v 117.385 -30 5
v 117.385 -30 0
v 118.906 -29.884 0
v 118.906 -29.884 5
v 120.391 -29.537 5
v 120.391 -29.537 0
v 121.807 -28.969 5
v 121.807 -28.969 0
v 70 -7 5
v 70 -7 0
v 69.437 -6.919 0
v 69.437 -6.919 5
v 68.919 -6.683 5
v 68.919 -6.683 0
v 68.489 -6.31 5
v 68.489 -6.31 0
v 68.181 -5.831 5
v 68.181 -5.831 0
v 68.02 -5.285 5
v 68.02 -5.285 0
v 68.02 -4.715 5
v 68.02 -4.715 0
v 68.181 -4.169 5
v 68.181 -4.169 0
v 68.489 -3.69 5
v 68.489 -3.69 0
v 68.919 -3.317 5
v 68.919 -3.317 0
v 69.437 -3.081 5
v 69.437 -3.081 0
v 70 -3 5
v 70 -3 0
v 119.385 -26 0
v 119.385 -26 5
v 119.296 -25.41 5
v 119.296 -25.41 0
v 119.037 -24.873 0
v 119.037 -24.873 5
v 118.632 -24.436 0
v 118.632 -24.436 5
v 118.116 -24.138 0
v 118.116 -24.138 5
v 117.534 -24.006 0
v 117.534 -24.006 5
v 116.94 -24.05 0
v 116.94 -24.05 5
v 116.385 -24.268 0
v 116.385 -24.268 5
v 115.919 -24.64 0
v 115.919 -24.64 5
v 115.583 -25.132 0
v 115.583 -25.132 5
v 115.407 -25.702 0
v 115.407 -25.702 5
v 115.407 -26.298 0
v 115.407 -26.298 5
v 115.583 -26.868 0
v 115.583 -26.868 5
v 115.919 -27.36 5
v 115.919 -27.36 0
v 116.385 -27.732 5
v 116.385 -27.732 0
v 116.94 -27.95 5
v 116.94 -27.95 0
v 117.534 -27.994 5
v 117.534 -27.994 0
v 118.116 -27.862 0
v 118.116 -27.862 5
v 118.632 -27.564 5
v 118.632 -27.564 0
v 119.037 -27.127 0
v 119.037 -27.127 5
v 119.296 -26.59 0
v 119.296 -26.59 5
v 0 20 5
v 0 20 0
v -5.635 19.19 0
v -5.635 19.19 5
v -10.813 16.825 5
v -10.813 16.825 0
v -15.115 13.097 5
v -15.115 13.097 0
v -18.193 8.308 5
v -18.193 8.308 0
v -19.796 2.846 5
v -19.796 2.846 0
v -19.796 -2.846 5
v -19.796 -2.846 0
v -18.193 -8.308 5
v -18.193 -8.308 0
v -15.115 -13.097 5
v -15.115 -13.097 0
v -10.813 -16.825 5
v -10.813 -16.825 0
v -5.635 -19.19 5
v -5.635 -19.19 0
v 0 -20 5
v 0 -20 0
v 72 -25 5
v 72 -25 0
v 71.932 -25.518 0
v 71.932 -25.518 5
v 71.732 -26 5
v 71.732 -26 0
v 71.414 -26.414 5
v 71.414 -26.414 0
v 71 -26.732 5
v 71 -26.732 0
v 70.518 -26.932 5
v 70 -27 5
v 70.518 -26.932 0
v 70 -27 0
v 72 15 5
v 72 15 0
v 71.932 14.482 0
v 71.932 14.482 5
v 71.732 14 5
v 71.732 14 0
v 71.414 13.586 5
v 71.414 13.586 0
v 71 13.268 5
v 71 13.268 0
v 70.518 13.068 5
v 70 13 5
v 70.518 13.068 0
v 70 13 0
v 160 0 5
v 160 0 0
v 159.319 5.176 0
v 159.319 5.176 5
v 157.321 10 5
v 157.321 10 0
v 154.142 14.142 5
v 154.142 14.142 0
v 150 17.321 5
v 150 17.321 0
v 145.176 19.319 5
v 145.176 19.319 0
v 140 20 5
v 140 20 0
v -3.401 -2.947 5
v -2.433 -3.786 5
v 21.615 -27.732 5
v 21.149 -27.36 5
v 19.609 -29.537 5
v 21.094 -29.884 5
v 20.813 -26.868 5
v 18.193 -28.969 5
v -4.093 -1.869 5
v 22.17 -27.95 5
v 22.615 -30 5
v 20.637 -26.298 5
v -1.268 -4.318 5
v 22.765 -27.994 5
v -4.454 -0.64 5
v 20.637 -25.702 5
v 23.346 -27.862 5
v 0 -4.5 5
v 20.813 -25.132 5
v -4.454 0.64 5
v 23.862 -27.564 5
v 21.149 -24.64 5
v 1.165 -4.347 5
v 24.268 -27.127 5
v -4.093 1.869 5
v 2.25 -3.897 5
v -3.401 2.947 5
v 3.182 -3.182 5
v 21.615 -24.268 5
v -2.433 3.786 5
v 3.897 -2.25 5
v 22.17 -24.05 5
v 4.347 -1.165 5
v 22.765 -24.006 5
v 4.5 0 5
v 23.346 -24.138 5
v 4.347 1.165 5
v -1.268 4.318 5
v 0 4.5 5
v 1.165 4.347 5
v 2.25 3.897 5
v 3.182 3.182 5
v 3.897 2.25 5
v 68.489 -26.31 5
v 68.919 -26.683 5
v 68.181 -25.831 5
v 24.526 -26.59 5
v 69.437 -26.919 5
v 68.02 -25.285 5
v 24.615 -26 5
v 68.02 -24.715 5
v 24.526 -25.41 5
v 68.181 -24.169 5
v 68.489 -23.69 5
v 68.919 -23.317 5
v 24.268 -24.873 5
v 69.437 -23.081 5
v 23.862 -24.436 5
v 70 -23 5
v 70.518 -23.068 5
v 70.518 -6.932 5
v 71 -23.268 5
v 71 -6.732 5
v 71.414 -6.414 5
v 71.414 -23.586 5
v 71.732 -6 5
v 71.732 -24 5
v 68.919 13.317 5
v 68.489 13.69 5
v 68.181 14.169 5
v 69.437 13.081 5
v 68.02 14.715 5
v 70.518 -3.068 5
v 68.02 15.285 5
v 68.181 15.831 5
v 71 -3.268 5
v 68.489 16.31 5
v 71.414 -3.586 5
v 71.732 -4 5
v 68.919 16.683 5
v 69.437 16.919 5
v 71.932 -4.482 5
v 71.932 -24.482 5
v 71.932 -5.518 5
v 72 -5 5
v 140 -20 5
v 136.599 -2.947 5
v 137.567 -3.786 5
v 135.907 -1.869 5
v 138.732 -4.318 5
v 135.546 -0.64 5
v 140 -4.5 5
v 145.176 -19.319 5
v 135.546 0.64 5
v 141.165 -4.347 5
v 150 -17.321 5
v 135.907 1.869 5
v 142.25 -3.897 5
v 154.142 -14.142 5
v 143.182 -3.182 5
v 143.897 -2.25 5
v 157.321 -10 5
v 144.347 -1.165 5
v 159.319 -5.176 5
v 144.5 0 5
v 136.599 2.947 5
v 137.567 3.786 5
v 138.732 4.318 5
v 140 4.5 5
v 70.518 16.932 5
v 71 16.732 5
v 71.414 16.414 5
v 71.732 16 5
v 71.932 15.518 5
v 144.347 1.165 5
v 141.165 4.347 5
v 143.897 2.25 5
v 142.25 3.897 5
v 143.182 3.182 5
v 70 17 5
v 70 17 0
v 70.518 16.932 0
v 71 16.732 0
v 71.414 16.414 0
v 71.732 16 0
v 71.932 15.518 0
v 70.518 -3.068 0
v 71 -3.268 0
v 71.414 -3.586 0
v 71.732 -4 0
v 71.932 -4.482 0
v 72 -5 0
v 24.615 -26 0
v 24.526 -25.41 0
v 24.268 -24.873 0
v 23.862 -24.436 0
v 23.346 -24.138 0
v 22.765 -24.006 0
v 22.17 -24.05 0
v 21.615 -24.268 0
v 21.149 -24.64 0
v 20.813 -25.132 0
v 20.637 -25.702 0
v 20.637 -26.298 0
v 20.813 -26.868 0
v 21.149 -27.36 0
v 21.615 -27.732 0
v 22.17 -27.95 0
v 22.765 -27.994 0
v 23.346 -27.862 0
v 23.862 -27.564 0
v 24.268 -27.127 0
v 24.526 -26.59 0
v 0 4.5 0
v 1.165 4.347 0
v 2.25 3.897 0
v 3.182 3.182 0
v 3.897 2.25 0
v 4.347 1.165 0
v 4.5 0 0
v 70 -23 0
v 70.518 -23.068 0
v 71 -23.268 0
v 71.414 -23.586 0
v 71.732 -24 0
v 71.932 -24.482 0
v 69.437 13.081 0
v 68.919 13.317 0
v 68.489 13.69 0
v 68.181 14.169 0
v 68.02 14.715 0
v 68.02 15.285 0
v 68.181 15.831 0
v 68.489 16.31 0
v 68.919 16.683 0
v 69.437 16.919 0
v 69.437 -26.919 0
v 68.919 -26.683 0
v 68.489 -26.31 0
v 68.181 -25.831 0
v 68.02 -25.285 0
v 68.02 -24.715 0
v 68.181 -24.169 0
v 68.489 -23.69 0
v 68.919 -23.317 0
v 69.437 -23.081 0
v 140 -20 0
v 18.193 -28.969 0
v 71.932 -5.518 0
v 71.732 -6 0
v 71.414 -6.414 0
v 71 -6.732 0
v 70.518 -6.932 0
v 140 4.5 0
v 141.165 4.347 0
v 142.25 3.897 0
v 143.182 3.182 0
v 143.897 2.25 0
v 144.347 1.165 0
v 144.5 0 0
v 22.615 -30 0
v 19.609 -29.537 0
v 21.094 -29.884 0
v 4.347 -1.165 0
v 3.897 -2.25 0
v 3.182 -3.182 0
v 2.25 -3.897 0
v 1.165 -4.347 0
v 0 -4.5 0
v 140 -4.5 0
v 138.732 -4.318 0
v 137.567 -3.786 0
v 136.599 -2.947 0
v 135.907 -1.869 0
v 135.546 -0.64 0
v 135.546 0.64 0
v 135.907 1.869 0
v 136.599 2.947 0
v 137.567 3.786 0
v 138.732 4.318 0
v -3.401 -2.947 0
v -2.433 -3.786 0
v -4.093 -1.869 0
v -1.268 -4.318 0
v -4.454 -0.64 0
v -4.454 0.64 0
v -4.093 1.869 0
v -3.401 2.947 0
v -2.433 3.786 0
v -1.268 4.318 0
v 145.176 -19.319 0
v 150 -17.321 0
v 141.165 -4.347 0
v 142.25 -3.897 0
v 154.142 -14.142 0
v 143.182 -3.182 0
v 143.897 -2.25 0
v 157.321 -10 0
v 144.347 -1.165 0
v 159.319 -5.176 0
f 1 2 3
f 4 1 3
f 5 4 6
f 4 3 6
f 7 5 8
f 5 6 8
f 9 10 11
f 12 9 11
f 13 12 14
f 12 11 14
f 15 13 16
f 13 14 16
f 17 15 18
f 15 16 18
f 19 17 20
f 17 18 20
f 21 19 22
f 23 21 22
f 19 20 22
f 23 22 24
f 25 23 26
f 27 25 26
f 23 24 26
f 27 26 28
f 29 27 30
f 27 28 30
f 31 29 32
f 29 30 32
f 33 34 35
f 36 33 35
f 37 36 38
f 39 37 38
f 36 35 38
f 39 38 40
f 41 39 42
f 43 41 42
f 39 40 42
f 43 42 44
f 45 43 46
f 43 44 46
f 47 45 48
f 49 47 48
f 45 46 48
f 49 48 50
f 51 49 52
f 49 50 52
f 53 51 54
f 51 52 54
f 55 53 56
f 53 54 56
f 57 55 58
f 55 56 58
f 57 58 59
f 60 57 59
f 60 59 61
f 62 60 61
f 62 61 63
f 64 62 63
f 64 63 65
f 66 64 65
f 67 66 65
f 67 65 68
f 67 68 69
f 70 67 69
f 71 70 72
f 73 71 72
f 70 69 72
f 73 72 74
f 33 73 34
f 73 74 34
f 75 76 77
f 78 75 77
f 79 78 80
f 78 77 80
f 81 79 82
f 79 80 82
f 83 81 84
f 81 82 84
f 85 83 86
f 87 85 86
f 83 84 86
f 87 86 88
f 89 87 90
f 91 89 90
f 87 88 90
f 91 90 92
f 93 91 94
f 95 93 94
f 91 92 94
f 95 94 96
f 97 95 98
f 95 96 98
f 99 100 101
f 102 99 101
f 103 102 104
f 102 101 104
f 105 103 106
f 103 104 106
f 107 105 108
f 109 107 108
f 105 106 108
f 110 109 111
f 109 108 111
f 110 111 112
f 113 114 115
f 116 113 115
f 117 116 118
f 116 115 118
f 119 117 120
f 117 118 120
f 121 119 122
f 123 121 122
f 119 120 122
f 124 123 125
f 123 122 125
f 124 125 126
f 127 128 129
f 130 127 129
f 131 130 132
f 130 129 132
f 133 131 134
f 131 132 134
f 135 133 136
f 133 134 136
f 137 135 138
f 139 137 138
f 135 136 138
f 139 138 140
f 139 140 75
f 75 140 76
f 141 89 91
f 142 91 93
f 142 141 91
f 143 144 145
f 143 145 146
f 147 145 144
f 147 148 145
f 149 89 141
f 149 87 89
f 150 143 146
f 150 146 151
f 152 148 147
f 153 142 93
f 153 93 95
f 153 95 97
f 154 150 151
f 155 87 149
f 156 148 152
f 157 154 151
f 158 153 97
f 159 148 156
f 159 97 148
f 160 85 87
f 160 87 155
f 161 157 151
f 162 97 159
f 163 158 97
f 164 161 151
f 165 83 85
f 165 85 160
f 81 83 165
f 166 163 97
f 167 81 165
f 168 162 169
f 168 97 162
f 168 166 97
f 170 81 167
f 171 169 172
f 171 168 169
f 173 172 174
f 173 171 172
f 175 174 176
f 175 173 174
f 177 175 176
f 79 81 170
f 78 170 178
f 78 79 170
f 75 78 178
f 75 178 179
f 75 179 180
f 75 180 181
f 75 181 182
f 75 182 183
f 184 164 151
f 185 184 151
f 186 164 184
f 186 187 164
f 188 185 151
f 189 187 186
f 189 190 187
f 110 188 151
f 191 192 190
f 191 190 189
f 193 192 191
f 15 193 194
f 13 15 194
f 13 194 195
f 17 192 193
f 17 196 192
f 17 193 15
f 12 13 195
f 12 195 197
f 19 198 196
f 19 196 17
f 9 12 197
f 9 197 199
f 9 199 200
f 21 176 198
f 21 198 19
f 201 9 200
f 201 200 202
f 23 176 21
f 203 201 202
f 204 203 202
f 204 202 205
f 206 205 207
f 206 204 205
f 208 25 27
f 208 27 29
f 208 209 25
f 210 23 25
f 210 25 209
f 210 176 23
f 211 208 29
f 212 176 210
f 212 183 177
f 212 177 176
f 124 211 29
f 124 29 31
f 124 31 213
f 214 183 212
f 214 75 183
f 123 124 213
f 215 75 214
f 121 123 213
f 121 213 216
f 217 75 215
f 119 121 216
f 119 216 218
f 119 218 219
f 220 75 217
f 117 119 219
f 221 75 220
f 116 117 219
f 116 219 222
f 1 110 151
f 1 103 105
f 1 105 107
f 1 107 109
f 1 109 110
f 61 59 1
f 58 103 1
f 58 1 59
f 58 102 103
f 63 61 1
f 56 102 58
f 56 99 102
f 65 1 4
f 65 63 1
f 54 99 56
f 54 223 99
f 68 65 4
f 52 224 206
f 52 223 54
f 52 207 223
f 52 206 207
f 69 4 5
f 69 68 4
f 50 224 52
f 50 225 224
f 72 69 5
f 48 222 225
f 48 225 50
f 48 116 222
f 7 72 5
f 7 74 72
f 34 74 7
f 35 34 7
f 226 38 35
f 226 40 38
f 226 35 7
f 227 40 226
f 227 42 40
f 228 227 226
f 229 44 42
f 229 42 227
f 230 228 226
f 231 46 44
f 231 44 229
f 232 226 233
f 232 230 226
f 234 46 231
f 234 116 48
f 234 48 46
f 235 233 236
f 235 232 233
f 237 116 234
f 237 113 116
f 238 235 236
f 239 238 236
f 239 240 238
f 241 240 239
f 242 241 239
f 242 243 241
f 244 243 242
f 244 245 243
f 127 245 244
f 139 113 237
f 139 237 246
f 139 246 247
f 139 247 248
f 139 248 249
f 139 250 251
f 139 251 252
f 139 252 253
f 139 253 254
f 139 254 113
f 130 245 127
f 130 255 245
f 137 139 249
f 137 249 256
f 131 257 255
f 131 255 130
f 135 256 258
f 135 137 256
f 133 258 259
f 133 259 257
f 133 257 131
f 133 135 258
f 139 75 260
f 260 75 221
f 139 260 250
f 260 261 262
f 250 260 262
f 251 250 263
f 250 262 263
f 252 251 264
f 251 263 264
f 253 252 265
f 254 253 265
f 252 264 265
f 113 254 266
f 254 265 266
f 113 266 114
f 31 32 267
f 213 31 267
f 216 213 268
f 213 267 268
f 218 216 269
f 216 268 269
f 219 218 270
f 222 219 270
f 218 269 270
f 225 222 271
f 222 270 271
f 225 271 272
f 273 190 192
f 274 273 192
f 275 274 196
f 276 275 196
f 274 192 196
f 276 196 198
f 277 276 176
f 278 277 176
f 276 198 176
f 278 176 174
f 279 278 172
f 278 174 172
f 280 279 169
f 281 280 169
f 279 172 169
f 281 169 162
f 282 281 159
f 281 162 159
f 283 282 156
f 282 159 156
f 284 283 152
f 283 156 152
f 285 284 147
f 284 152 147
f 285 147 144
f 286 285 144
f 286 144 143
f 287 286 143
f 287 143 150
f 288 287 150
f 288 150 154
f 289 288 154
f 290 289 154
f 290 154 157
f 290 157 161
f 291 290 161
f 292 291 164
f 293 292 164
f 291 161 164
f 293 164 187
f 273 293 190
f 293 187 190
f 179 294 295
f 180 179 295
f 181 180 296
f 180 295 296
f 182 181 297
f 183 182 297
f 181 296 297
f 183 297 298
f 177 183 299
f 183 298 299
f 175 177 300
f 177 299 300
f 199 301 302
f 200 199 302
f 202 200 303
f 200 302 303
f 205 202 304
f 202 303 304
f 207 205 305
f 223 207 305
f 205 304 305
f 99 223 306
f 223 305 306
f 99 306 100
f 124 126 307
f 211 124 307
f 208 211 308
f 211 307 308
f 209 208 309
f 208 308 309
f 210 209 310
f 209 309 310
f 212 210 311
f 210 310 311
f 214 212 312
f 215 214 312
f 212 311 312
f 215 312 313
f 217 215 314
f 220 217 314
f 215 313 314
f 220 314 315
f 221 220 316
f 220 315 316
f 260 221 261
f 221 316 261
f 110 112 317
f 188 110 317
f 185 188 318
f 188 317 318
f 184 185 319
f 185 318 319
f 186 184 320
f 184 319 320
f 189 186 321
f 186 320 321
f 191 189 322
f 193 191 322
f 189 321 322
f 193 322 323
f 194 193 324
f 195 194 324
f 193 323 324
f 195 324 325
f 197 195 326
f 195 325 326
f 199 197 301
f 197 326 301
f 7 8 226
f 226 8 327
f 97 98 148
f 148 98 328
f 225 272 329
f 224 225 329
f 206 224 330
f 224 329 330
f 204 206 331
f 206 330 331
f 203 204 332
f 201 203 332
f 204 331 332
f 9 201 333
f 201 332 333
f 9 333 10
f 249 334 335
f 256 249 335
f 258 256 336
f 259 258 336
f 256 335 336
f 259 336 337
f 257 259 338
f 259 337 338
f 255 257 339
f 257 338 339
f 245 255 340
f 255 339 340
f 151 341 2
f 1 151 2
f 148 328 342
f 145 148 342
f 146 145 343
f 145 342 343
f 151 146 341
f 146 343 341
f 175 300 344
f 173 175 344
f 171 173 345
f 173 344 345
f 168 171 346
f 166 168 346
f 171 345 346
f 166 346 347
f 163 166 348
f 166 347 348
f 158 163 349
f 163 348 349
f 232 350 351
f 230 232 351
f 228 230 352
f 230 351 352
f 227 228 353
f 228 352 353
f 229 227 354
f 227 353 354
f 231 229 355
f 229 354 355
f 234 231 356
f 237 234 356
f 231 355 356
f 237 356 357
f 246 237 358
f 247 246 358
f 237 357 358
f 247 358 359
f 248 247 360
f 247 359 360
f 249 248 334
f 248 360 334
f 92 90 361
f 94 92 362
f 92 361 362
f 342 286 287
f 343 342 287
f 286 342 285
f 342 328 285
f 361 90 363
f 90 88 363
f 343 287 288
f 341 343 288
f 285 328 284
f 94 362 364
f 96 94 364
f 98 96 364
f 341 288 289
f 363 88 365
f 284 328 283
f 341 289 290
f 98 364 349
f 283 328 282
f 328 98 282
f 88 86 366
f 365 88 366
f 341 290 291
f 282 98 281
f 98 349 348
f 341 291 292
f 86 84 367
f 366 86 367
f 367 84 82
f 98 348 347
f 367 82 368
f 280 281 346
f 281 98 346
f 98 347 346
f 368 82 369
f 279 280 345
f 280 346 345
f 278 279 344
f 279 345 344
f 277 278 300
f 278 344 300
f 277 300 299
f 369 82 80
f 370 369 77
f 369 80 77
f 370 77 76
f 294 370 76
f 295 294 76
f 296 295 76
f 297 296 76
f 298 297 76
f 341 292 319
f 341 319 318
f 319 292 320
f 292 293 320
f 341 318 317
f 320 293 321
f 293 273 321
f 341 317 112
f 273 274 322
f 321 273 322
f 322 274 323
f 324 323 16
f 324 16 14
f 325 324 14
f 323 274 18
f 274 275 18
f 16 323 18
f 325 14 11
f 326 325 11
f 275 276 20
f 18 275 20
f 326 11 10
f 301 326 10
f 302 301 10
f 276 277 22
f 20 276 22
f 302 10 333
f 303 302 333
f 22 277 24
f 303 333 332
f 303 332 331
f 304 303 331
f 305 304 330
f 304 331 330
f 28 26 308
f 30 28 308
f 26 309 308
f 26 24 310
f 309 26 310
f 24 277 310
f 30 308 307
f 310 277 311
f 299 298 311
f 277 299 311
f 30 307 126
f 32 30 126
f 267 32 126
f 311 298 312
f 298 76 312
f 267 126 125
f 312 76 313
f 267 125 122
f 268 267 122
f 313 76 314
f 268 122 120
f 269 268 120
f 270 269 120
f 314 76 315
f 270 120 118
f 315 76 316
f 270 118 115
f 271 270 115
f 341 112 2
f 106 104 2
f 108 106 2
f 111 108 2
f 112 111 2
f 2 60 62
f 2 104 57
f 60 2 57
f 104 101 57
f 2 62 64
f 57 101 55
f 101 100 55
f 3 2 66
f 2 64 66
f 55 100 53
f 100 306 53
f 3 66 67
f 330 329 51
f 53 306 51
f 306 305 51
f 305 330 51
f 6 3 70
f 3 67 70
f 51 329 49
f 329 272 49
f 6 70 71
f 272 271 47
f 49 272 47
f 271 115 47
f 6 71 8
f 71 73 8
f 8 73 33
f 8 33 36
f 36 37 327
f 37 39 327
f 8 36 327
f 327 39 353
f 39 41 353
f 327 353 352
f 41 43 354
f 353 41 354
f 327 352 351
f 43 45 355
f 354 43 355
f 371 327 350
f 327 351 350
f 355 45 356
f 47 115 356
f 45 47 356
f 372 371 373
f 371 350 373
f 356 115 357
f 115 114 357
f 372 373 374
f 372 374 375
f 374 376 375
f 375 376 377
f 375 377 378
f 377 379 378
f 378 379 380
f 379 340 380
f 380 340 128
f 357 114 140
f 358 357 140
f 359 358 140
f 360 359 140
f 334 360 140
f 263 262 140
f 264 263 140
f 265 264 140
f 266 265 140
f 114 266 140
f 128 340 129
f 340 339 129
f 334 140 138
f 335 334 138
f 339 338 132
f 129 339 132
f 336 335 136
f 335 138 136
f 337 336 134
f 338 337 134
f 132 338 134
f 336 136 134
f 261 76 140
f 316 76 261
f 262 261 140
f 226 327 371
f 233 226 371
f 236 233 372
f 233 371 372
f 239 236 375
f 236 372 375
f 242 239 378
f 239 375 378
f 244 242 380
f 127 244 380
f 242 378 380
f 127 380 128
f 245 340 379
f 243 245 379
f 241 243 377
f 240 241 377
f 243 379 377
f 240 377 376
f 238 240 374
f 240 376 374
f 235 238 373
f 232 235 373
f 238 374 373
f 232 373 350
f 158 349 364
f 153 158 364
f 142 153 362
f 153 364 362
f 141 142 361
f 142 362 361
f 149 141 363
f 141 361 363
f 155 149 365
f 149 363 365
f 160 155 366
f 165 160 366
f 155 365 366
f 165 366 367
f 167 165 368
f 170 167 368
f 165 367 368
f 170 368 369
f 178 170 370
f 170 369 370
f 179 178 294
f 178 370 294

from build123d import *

# Parameters (mm, degrees)
EXTRUDE_1_DEPTH     = 5
SKETCH_2_R          = 2
CUT_EXTRUDE_1_DEPTH = 5


with BuildPart() as part:
    # 草图1 → 凸台-拉伸1 (new body)
    with BuildSketch(Plane.XY):
        with BuildLine():
            ThreePointArc((20, 0), (14.142135624, 14.142135624), (0, 20))
            Line((0, 20), (0, 4.5))
            ThreePointArc((0, 4.5), (3.181980515, 3.181980515), (4.5, 0))
            ThreePointArc((4.5, 0), (3.181980515, -3.181980515), (0, -4.5))
            Line((0, -4.5), (0, -20))
            ThreePointArc((0, -20), (14.142135624, -14.142135624), (20, 0))
        make_face()
        with BuildLine():
            Line((0, 4.5), (0, 20))
            ThreePointArc((0, 20), (-20, 0), (0, -20))
            Line((0, -20), (0, -4.5))
            ThreePointArc((0, -4.5), (-4.5, 0), (0, 4.5))
        make_face()
        with BuildLine():
            Line((70, 20), (0, 20))
            ThreePointArc((0, 20), (14.142135624, 14.142135624), (20, 0))
            ThreePointArc((20, 0), (14.142135624, -14.142135624), (0, -20))
            Line((0, -20), (18.19327595, -28.969251351))
            ThreePointArc((18.19327595, -28.969251351), (20.344914528, -29.738904289), (22.615100256, -30))
            Line((22.615100256, -30), (70, -30))
            Line((70, -30), (70, -27))
            ThreePointArc((70, -27), (68, -25), (70, -23))
            Line((70, -23), (70, -7))
            ThreePointArc((70, -7), (68, -5), (70, -3))
            Line((70, -3), (70, 13))
            ThreePointArc((70, 13), (68, 15), (70, 17))
            Line((70, 17), (70, 20))
        make_face()
        with BuildLine():
            Line((140, 20), (70, 20))
            Line((70, 20), (70, 17))
            ThreePointArc((70, 17), (71.414213562, 16.414213562), (72, 15))
            ThreePointArc((72, 15), (71.414213562, 13.585786438), (70, 13))
            Line((70, 13), (70, -3))
            ThreePointArc((70, -3), (71.414213562, -3.585786438), (72, -5))
            ThreePointArc((72, -5), (71.414213562, -6.414213562), (70, -7))
            Line((70, -7), (70, -23))
            ThreePointArc((70, -23), (71.414213562, -23.585786438), (72, -25))
            ThreePointArc((72, -25), (71.414213562, -26.414213562), (70, -27))
            Line((70, -27), (70, -30))
            Line((70, -30), (117.384899744, -30))
            ThreePointArc((117.384899744, -30), (119.655085472, -29.738904289), (121.80672405, -28.969251351))
            Line((121.80672405, -28.969251351), (140, -20))
            ThreePointArc((140, -20), (120, 0), (140, 20))
        make_face()
        with BuildLine():
            ThreePointArc((160, 0), (154.142135624, 14.142135624), (140, 20))
            Line((140, 20), (140, 4.5))
            ThreePointArc((140, 4.5), (143.181980515, 3.181980515), (144.5, 0))
            ThreePointArc((144.5, 0), (143.181980515, -3.181980515), (140, -4.5))
            Line((140, -4.5), (140, -20))
            ThreePointArc((140, -20), (154.142135624, -14.142135624), (160, 0))
        make_face()
        with BuildLine():
            Line((140, 4.5), (140, 20))
            ThreePointArc((140, 20), (120, 0), (140, -20))
            Line((140, -20), (140, -4.5))
            ThreePointArc((140, -4.5), (135.5, 0), (140, 4.5))
        make_face()
    extrude(amount=EXTRUDE_1_DEPTH)

    # 草图2 → 切除-拉伸1 (cut)
    with BuildSketch(Plane.XY.offset(5)):
        with Locations((22.615100256, -26)):
            Circle(SKETCH_2_R)
        with Locations((117.384899744, -26)):
            Circle(SKETCH_2_R)
    extrude(amount=-CUT_EXTRUDE_1_DEPTH, mode=Mode.SUBTRACT)


solid = part.part
